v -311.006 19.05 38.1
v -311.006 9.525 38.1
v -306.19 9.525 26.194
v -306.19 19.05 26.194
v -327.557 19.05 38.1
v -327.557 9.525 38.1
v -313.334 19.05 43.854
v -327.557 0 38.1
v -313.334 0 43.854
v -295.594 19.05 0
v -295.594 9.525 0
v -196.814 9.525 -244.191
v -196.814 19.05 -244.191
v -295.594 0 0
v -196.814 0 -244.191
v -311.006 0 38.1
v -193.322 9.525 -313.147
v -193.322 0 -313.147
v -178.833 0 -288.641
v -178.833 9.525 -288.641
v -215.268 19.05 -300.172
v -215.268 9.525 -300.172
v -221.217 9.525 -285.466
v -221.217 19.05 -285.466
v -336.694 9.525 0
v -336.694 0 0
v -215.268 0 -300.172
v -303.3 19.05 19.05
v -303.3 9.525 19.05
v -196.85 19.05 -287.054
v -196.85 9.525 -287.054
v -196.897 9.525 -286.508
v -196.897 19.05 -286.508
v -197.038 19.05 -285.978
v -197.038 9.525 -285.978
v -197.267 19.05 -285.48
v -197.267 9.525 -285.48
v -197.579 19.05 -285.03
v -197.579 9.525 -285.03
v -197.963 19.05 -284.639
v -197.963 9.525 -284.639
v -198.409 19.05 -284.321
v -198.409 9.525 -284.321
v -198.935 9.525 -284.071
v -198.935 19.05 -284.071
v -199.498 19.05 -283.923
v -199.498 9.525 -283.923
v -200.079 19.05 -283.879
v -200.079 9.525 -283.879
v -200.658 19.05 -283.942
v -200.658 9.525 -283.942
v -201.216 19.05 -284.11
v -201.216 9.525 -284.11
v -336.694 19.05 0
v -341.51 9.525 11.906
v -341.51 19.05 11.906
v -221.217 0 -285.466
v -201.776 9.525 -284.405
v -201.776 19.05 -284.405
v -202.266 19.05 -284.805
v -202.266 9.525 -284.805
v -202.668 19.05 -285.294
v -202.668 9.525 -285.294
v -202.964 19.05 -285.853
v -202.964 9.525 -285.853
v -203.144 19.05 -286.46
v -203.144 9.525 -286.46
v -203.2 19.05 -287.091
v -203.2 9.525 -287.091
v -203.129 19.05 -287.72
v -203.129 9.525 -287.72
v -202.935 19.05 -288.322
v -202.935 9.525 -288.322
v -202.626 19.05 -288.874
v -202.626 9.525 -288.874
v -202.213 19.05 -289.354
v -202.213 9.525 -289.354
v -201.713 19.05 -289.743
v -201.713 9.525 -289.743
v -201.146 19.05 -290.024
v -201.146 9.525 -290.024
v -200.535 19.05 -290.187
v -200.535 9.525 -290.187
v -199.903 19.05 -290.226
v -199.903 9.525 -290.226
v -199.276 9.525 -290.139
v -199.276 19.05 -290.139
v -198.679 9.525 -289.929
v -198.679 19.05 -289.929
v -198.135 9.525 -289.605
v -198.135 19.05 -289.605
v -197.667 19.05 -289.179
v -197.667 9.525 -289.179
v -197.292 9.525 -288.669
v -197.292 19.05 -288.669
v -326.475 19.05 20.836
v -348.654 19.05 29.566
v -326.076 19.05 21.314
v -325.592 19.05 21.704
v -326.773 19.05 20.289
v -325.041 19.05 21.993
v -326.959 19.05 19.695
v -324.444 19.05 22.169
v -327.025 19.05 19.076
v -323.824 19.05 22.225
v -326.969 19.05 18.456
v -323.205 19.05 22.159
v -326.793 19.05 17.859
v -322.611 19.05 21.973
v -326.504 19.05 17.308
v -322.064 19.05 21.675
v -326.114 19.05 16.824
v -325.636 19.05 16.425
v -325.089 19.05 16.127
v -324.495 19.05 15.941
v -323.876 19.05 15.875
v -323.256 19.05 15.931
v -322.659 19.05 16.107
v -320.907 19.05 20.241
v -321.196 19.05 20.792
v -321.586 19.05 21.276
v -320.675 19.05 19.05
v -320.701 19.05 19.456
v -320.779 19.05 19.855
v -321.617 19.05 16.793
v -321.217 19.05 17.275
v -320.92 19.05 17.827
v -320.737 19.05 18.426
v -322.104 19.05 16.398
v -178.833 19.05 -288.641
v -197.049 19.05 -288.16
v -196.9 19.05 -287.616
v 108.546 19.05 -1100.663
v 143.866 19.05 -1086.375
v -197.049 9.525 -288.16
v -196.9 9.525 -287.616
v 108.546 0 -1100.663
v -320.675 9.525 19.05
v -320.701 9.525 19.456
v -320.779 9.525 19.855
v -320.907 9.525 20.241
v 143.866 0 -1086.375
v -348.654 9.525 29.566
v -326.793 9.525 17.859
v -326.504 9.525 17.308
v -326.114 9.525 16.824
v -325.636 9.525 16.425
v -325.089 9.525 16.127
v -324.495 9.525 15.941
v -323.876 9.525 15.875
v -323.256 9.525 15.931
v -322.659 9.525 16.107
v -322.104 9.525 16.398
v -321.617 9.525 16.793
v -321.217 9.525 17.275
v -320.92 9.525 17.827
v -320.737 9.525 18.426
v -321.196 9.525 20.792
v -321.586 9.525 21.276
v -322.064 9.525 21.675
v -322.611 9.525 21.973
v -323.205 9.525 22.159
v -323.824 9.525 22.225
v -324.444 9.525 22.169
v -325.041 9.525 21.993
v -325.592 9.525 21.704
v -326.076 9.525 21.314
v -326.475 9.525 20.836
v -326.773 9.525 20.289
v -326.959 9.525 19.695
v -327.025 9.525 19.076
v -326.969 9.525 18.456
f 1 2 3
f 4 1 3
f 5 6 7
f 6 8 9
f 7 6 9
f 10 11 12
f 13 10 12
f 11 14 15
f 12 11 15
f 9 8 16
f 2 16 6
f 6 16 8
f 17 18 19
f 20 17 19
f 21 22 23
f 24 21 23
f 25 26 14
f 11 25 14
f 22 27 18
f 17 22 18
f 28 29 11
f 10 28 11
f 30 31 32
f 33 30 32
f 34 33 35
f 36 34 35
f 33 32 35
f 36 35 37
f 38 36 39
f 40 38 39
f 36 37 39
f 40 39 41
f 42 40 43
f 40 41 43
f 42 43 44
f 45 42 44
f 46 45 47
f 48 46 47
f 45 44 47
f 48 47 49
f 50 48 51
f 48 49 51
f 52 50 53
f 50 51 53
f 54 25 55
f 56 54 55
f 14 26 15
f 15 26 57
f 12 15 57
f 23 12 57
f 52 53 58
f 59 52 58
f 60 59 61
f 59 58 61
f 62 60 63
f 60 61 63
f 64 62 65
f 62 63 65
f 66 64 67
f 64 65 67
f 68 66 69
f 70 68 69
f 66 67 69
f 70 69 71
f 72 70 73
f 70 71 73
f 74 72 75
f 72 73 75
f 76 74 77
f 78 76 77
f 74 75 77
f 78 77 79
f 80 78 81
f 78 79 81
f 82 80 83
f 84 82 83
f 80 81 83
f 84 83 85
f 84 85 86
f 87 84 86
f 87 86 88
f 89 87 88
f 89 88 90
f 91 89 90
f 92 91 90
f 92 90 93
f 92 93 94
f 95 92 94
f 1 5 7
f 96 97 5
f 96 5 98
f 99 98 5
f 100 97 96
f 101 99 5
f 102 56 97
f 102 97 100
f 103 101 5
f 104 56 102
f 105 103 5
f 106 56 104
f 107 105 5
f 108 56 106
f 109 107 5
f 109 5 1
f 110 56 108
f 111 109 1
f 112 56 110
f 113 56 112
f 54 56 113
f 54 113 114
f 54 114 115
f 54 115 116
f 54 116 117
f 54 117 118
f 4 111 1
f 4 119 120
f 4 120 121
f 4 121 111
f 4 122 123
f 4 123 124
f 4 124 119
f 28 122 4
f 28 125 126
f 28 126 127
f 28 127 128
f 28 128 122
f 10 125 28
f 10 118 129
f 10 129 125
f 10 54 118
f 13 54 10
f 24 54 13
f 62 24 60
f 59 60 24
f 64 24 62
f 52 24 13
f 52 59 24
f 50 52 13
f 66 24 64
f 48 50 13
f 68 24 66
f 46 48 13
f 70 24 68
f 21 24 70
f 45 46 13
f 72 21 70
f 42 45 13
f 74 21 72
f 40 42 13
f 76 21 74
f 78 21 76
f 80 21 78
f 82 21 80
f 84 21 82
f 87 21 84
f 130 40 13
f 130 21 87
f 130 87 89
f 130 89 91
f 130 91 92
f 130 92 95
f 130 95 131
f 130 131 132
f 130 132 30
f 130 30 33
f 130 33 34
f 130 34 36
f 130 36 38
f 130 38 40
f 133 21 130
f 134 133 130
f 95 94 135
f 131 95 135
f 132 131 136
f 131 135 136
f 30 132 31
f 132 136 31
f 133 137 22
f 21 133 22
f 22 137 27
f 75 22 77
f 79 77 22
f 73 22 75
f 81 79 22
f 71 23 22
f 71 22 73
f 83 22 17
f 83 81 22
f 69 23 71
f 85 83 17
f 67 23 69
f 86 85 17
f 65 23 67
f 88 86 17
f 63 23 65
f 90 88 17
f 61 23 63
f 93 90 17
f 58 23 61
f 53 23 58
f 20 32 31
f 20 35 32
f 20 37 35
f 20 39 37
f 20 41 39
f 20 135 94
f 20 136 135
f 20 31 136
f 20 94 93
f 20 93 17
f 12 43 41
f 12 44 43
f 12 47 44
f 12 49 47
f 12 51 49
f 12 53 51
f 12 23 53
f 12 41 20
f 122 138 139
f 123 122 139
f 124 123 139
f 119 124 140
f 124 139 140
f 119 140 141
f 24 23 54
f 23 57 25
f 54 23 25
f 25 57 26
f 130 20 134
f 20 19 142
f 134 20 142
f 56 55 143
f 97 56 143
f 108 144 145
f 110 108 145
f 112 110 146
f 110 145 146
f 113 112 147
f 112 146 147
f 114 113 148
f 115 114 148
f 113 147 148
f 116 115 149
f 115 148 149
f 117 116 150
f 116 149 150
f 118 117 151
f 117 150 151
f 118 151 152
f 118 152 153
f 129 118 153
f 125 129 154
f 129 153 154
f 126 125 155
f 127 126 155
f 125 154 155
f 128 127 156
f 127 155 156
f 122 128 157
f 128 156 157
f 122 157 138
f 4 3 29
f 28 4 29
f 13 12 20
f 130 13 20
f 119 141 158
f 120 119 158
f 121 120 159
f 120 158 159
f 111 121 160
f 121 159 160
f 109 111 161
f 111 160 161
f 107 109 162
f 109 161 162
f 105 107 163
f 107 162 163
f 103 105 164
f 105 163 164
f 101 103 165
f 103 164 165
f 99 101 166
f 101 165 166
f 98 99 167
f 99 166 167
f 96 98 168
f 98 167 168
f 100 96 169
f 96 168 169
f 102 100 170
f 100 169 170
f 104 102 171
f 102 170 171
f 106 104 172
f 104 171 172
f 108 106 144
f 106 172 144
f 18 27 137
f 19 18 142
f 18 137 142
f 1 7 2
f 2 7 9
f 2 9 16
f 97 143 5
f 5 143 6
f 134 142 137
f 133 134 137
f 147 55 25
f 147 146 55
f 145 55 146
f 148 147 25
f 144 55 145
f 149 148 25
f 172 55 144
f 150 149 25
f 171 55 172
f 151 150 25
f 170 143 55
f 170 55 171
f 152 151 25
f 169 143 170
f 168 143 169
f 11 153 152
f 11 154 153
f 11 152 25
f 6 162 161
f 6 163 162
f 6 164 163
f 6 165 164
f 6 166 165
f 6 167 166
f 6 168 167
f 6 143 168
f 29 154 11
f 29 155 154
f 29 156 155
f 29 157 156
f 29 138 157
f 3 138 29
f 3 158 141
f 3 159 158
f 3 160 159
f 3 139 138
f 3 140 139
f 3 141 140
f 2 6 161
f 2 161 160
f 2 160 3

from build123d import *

# Parameters (mm, degrees)
BOSS_EXTRUDE3_DEPTH = 19.05
SKETCH6_R           = 3.175
CUT_EXTRUDE3_DEPTH  = 9.525
CUT_EXTRUDE4_DEPTH  = 9.525


with BuildPart() as part:
    # Sketch2 → Boss-Extrude3 (new body)
    with BuildSketch(Plane(origin=(0, 0, 0), x_dir=(1, 0, 0), z_dir=(0, 1, 0))):
        Polygon((-336.69350738, 0), (-316.143895572, 0), (-209.015455166, 264.828592555), (-221.216787177, 285.466092555), align=None)
        Polygon((-316.143895572, 0), (-295.594283764, 0), (-196.814123155, 244.191092555), (-209.015455166, 264.828592555), align=None)
        with BuildLine():
            Line((-322.659375, -16.106696225), (-316.143895572, 0))
            Line((-316.143895572, 0), (-336.69350738, 0))
            Line((-336.69350738, 0), (-341.509822647, -11.90625))
            Line((-341.509822647, -11.90625), (-326.793303775, -17.859375))
            ThreePointArc((-326.793303775, -17.859375), (-325.089331047, -16.126870931), (-322.659375, -16.106696225))
        make_face()
        with BuildLine():
            Line((-303.300388192, -19.05), (-295.594283764, 0))
            Line((-295.594283764, 0), (-316.143895572, 0))
            Line((-316.143895572, 0), (-322.659375, -16.106696225))
            ThreePointArc((-322.659375, -16.106696225), (-321.217429073, -17.275121043), (-320.675, -19.05))
            Line((-320.675, -19.05), (-303.300388192, -19.05))
        make_face()
        with BuildLine():
            Line((-327.557139607, -38.1), (-311.00649262, -38.1))
            Line((-311.00649262, -38.1), (-306.190177353, -26.19375))
            Line((-306.190177353, -26.19375), (-320.906696225, -20.240625))
            ThreePointArc((-320.906696225, -20.240625), (-325.040625, -21.993303775), (-326.793303775, -17.859375))
            Line((-326.793303775, -17.859375), (-341.509822647, -11.90625))
            Line((-341.509822647, -11.90625), (-348.653572647, -29.566072647))
            Line((-348.653572647, -29.566072647), (-327.557139607, -38.1))
        make_face()
        with BuildLine():
            Line((-320.906696225, -20.240625), (-306.190177353, -26.19375))
            Line((-306.190177353, -26.19375), (-303.300388192, -19.05))
            Line((-303.300388192, -19.05), (-320.675, -19.05))
            ThreePointArc((-320.675, -19.05), (-320.733462299, -19.656479808), (-320.906696225, -20.240625))
        make_face()
        Polygon((-313.333927353, -43.853572647), (-311.00649262, -38.1), (-327.557139607, -38.1), align=None)
        Polygon((-183.626593256, 296.748681841), (-178.833212823, 288.641092555), (143.866072647, 1086.375076786), (108.546427353, 1100.662576786), (-215.267964049, 300.171976915), (-193.321682542, 313.147088585), align=None)
        with BuildLine():
            Line((-196.814123155, 244.191092555), (-187.823667989, 266.416092555))
            Line((-187.823667989, 266.416092555), (-198.409151786, 284.320524764))
            ThreePointArc((-198.409151786, 284.320524764), (-199.787821823, 283.887463765), (-201.215625, 284.11028878))
            Line((-201.215625, 284.11028878), (-209.015455166, 264.828592555))
            Line((-209.015455166, 264.828592555), (-196.814123155, 244.191092555))
        make_face()
        with BuildLine():
            Line((-197.291932209, 288.669440769), (-183.626593256, 296.748681841))
            Line((-183.626593256, 296.748681841), (-193.321682542, 313.147088585))
            Line((-193.321682542, 313.147088585), (-215.267964049, 300.171976915))
            Line((-215.267964049, 300.171976915), (-221.216787177, 285.466092555))
            Line((-221.216787177, 285.466092555), (-209.015455166, 264.828592555))
            Line((-209.015455166, 264.828592555), (-201.215625, 284.11028878))
            ThreePointArc((-201.215625, 284.11028878), (-202.431501435, 289.124673395), (-197.291932209, 288.669440769))
        make_face()
        with BuildLine():
            Line((-187.823667989, 266.416092555), (-178.833212823, 288.641092555))
            Line((-178.833212823, 288.641092555), (-183.626593256, 296.748681841))
            Line((-183.626593256, 296.748681841), (-197.291932209, 288.669440769))
            ThreePointArc((-197.291932209, 288.669440769), (-196.962475287, 287.891188748), (-196.85, 287.053592555))
            ThreePointArc((-196.85, 287.053592555), (-197.26719806, 285.480330511), (-198.409151786, 284.320524764))
            Line((-198.409151786, 284.320524764), (-187.823667989, 266.416092555))
        make_face()
    extrude(amount=BOSS_EXTRUDE3_DEPTH)

    # Sketch6 → Cut-Extrude3 (cut)
    with BuildSketch(Plane.XZ):
        Polygon((-327.557139607, 38.1), (-348.653572647, 29.566072647), (-336.69350738, 0), (-295.594283764, 0), (-311.00649262, 38.1), align=None)
        with Locations(Location((-323.85, 19.05, 0), (0, 0, 270))):
            Circle(SKETCH6_R, mode=Mode.SUBTRACT)
    extrude(amount=-CUT_EXTRUDE3_DEPTH, mode=Mode.SUBTRACT)

    # Sketch7 → Cut-Extrude4 (cut)
    with BuildSketch(Plane.XZ):
        Polygon((-196.814123155, -244.191092555), (-221.216787177, -285.466092555), (-215.267964049, -300.171976915), (-193.321682542, -313.147088585), (-178.833212823, -288.641092555), align=None)
    extrude(amount=-CUT_EXTRUDE4_DEPTH, mode=Mode.SUBTRACT)


solid = part.part
